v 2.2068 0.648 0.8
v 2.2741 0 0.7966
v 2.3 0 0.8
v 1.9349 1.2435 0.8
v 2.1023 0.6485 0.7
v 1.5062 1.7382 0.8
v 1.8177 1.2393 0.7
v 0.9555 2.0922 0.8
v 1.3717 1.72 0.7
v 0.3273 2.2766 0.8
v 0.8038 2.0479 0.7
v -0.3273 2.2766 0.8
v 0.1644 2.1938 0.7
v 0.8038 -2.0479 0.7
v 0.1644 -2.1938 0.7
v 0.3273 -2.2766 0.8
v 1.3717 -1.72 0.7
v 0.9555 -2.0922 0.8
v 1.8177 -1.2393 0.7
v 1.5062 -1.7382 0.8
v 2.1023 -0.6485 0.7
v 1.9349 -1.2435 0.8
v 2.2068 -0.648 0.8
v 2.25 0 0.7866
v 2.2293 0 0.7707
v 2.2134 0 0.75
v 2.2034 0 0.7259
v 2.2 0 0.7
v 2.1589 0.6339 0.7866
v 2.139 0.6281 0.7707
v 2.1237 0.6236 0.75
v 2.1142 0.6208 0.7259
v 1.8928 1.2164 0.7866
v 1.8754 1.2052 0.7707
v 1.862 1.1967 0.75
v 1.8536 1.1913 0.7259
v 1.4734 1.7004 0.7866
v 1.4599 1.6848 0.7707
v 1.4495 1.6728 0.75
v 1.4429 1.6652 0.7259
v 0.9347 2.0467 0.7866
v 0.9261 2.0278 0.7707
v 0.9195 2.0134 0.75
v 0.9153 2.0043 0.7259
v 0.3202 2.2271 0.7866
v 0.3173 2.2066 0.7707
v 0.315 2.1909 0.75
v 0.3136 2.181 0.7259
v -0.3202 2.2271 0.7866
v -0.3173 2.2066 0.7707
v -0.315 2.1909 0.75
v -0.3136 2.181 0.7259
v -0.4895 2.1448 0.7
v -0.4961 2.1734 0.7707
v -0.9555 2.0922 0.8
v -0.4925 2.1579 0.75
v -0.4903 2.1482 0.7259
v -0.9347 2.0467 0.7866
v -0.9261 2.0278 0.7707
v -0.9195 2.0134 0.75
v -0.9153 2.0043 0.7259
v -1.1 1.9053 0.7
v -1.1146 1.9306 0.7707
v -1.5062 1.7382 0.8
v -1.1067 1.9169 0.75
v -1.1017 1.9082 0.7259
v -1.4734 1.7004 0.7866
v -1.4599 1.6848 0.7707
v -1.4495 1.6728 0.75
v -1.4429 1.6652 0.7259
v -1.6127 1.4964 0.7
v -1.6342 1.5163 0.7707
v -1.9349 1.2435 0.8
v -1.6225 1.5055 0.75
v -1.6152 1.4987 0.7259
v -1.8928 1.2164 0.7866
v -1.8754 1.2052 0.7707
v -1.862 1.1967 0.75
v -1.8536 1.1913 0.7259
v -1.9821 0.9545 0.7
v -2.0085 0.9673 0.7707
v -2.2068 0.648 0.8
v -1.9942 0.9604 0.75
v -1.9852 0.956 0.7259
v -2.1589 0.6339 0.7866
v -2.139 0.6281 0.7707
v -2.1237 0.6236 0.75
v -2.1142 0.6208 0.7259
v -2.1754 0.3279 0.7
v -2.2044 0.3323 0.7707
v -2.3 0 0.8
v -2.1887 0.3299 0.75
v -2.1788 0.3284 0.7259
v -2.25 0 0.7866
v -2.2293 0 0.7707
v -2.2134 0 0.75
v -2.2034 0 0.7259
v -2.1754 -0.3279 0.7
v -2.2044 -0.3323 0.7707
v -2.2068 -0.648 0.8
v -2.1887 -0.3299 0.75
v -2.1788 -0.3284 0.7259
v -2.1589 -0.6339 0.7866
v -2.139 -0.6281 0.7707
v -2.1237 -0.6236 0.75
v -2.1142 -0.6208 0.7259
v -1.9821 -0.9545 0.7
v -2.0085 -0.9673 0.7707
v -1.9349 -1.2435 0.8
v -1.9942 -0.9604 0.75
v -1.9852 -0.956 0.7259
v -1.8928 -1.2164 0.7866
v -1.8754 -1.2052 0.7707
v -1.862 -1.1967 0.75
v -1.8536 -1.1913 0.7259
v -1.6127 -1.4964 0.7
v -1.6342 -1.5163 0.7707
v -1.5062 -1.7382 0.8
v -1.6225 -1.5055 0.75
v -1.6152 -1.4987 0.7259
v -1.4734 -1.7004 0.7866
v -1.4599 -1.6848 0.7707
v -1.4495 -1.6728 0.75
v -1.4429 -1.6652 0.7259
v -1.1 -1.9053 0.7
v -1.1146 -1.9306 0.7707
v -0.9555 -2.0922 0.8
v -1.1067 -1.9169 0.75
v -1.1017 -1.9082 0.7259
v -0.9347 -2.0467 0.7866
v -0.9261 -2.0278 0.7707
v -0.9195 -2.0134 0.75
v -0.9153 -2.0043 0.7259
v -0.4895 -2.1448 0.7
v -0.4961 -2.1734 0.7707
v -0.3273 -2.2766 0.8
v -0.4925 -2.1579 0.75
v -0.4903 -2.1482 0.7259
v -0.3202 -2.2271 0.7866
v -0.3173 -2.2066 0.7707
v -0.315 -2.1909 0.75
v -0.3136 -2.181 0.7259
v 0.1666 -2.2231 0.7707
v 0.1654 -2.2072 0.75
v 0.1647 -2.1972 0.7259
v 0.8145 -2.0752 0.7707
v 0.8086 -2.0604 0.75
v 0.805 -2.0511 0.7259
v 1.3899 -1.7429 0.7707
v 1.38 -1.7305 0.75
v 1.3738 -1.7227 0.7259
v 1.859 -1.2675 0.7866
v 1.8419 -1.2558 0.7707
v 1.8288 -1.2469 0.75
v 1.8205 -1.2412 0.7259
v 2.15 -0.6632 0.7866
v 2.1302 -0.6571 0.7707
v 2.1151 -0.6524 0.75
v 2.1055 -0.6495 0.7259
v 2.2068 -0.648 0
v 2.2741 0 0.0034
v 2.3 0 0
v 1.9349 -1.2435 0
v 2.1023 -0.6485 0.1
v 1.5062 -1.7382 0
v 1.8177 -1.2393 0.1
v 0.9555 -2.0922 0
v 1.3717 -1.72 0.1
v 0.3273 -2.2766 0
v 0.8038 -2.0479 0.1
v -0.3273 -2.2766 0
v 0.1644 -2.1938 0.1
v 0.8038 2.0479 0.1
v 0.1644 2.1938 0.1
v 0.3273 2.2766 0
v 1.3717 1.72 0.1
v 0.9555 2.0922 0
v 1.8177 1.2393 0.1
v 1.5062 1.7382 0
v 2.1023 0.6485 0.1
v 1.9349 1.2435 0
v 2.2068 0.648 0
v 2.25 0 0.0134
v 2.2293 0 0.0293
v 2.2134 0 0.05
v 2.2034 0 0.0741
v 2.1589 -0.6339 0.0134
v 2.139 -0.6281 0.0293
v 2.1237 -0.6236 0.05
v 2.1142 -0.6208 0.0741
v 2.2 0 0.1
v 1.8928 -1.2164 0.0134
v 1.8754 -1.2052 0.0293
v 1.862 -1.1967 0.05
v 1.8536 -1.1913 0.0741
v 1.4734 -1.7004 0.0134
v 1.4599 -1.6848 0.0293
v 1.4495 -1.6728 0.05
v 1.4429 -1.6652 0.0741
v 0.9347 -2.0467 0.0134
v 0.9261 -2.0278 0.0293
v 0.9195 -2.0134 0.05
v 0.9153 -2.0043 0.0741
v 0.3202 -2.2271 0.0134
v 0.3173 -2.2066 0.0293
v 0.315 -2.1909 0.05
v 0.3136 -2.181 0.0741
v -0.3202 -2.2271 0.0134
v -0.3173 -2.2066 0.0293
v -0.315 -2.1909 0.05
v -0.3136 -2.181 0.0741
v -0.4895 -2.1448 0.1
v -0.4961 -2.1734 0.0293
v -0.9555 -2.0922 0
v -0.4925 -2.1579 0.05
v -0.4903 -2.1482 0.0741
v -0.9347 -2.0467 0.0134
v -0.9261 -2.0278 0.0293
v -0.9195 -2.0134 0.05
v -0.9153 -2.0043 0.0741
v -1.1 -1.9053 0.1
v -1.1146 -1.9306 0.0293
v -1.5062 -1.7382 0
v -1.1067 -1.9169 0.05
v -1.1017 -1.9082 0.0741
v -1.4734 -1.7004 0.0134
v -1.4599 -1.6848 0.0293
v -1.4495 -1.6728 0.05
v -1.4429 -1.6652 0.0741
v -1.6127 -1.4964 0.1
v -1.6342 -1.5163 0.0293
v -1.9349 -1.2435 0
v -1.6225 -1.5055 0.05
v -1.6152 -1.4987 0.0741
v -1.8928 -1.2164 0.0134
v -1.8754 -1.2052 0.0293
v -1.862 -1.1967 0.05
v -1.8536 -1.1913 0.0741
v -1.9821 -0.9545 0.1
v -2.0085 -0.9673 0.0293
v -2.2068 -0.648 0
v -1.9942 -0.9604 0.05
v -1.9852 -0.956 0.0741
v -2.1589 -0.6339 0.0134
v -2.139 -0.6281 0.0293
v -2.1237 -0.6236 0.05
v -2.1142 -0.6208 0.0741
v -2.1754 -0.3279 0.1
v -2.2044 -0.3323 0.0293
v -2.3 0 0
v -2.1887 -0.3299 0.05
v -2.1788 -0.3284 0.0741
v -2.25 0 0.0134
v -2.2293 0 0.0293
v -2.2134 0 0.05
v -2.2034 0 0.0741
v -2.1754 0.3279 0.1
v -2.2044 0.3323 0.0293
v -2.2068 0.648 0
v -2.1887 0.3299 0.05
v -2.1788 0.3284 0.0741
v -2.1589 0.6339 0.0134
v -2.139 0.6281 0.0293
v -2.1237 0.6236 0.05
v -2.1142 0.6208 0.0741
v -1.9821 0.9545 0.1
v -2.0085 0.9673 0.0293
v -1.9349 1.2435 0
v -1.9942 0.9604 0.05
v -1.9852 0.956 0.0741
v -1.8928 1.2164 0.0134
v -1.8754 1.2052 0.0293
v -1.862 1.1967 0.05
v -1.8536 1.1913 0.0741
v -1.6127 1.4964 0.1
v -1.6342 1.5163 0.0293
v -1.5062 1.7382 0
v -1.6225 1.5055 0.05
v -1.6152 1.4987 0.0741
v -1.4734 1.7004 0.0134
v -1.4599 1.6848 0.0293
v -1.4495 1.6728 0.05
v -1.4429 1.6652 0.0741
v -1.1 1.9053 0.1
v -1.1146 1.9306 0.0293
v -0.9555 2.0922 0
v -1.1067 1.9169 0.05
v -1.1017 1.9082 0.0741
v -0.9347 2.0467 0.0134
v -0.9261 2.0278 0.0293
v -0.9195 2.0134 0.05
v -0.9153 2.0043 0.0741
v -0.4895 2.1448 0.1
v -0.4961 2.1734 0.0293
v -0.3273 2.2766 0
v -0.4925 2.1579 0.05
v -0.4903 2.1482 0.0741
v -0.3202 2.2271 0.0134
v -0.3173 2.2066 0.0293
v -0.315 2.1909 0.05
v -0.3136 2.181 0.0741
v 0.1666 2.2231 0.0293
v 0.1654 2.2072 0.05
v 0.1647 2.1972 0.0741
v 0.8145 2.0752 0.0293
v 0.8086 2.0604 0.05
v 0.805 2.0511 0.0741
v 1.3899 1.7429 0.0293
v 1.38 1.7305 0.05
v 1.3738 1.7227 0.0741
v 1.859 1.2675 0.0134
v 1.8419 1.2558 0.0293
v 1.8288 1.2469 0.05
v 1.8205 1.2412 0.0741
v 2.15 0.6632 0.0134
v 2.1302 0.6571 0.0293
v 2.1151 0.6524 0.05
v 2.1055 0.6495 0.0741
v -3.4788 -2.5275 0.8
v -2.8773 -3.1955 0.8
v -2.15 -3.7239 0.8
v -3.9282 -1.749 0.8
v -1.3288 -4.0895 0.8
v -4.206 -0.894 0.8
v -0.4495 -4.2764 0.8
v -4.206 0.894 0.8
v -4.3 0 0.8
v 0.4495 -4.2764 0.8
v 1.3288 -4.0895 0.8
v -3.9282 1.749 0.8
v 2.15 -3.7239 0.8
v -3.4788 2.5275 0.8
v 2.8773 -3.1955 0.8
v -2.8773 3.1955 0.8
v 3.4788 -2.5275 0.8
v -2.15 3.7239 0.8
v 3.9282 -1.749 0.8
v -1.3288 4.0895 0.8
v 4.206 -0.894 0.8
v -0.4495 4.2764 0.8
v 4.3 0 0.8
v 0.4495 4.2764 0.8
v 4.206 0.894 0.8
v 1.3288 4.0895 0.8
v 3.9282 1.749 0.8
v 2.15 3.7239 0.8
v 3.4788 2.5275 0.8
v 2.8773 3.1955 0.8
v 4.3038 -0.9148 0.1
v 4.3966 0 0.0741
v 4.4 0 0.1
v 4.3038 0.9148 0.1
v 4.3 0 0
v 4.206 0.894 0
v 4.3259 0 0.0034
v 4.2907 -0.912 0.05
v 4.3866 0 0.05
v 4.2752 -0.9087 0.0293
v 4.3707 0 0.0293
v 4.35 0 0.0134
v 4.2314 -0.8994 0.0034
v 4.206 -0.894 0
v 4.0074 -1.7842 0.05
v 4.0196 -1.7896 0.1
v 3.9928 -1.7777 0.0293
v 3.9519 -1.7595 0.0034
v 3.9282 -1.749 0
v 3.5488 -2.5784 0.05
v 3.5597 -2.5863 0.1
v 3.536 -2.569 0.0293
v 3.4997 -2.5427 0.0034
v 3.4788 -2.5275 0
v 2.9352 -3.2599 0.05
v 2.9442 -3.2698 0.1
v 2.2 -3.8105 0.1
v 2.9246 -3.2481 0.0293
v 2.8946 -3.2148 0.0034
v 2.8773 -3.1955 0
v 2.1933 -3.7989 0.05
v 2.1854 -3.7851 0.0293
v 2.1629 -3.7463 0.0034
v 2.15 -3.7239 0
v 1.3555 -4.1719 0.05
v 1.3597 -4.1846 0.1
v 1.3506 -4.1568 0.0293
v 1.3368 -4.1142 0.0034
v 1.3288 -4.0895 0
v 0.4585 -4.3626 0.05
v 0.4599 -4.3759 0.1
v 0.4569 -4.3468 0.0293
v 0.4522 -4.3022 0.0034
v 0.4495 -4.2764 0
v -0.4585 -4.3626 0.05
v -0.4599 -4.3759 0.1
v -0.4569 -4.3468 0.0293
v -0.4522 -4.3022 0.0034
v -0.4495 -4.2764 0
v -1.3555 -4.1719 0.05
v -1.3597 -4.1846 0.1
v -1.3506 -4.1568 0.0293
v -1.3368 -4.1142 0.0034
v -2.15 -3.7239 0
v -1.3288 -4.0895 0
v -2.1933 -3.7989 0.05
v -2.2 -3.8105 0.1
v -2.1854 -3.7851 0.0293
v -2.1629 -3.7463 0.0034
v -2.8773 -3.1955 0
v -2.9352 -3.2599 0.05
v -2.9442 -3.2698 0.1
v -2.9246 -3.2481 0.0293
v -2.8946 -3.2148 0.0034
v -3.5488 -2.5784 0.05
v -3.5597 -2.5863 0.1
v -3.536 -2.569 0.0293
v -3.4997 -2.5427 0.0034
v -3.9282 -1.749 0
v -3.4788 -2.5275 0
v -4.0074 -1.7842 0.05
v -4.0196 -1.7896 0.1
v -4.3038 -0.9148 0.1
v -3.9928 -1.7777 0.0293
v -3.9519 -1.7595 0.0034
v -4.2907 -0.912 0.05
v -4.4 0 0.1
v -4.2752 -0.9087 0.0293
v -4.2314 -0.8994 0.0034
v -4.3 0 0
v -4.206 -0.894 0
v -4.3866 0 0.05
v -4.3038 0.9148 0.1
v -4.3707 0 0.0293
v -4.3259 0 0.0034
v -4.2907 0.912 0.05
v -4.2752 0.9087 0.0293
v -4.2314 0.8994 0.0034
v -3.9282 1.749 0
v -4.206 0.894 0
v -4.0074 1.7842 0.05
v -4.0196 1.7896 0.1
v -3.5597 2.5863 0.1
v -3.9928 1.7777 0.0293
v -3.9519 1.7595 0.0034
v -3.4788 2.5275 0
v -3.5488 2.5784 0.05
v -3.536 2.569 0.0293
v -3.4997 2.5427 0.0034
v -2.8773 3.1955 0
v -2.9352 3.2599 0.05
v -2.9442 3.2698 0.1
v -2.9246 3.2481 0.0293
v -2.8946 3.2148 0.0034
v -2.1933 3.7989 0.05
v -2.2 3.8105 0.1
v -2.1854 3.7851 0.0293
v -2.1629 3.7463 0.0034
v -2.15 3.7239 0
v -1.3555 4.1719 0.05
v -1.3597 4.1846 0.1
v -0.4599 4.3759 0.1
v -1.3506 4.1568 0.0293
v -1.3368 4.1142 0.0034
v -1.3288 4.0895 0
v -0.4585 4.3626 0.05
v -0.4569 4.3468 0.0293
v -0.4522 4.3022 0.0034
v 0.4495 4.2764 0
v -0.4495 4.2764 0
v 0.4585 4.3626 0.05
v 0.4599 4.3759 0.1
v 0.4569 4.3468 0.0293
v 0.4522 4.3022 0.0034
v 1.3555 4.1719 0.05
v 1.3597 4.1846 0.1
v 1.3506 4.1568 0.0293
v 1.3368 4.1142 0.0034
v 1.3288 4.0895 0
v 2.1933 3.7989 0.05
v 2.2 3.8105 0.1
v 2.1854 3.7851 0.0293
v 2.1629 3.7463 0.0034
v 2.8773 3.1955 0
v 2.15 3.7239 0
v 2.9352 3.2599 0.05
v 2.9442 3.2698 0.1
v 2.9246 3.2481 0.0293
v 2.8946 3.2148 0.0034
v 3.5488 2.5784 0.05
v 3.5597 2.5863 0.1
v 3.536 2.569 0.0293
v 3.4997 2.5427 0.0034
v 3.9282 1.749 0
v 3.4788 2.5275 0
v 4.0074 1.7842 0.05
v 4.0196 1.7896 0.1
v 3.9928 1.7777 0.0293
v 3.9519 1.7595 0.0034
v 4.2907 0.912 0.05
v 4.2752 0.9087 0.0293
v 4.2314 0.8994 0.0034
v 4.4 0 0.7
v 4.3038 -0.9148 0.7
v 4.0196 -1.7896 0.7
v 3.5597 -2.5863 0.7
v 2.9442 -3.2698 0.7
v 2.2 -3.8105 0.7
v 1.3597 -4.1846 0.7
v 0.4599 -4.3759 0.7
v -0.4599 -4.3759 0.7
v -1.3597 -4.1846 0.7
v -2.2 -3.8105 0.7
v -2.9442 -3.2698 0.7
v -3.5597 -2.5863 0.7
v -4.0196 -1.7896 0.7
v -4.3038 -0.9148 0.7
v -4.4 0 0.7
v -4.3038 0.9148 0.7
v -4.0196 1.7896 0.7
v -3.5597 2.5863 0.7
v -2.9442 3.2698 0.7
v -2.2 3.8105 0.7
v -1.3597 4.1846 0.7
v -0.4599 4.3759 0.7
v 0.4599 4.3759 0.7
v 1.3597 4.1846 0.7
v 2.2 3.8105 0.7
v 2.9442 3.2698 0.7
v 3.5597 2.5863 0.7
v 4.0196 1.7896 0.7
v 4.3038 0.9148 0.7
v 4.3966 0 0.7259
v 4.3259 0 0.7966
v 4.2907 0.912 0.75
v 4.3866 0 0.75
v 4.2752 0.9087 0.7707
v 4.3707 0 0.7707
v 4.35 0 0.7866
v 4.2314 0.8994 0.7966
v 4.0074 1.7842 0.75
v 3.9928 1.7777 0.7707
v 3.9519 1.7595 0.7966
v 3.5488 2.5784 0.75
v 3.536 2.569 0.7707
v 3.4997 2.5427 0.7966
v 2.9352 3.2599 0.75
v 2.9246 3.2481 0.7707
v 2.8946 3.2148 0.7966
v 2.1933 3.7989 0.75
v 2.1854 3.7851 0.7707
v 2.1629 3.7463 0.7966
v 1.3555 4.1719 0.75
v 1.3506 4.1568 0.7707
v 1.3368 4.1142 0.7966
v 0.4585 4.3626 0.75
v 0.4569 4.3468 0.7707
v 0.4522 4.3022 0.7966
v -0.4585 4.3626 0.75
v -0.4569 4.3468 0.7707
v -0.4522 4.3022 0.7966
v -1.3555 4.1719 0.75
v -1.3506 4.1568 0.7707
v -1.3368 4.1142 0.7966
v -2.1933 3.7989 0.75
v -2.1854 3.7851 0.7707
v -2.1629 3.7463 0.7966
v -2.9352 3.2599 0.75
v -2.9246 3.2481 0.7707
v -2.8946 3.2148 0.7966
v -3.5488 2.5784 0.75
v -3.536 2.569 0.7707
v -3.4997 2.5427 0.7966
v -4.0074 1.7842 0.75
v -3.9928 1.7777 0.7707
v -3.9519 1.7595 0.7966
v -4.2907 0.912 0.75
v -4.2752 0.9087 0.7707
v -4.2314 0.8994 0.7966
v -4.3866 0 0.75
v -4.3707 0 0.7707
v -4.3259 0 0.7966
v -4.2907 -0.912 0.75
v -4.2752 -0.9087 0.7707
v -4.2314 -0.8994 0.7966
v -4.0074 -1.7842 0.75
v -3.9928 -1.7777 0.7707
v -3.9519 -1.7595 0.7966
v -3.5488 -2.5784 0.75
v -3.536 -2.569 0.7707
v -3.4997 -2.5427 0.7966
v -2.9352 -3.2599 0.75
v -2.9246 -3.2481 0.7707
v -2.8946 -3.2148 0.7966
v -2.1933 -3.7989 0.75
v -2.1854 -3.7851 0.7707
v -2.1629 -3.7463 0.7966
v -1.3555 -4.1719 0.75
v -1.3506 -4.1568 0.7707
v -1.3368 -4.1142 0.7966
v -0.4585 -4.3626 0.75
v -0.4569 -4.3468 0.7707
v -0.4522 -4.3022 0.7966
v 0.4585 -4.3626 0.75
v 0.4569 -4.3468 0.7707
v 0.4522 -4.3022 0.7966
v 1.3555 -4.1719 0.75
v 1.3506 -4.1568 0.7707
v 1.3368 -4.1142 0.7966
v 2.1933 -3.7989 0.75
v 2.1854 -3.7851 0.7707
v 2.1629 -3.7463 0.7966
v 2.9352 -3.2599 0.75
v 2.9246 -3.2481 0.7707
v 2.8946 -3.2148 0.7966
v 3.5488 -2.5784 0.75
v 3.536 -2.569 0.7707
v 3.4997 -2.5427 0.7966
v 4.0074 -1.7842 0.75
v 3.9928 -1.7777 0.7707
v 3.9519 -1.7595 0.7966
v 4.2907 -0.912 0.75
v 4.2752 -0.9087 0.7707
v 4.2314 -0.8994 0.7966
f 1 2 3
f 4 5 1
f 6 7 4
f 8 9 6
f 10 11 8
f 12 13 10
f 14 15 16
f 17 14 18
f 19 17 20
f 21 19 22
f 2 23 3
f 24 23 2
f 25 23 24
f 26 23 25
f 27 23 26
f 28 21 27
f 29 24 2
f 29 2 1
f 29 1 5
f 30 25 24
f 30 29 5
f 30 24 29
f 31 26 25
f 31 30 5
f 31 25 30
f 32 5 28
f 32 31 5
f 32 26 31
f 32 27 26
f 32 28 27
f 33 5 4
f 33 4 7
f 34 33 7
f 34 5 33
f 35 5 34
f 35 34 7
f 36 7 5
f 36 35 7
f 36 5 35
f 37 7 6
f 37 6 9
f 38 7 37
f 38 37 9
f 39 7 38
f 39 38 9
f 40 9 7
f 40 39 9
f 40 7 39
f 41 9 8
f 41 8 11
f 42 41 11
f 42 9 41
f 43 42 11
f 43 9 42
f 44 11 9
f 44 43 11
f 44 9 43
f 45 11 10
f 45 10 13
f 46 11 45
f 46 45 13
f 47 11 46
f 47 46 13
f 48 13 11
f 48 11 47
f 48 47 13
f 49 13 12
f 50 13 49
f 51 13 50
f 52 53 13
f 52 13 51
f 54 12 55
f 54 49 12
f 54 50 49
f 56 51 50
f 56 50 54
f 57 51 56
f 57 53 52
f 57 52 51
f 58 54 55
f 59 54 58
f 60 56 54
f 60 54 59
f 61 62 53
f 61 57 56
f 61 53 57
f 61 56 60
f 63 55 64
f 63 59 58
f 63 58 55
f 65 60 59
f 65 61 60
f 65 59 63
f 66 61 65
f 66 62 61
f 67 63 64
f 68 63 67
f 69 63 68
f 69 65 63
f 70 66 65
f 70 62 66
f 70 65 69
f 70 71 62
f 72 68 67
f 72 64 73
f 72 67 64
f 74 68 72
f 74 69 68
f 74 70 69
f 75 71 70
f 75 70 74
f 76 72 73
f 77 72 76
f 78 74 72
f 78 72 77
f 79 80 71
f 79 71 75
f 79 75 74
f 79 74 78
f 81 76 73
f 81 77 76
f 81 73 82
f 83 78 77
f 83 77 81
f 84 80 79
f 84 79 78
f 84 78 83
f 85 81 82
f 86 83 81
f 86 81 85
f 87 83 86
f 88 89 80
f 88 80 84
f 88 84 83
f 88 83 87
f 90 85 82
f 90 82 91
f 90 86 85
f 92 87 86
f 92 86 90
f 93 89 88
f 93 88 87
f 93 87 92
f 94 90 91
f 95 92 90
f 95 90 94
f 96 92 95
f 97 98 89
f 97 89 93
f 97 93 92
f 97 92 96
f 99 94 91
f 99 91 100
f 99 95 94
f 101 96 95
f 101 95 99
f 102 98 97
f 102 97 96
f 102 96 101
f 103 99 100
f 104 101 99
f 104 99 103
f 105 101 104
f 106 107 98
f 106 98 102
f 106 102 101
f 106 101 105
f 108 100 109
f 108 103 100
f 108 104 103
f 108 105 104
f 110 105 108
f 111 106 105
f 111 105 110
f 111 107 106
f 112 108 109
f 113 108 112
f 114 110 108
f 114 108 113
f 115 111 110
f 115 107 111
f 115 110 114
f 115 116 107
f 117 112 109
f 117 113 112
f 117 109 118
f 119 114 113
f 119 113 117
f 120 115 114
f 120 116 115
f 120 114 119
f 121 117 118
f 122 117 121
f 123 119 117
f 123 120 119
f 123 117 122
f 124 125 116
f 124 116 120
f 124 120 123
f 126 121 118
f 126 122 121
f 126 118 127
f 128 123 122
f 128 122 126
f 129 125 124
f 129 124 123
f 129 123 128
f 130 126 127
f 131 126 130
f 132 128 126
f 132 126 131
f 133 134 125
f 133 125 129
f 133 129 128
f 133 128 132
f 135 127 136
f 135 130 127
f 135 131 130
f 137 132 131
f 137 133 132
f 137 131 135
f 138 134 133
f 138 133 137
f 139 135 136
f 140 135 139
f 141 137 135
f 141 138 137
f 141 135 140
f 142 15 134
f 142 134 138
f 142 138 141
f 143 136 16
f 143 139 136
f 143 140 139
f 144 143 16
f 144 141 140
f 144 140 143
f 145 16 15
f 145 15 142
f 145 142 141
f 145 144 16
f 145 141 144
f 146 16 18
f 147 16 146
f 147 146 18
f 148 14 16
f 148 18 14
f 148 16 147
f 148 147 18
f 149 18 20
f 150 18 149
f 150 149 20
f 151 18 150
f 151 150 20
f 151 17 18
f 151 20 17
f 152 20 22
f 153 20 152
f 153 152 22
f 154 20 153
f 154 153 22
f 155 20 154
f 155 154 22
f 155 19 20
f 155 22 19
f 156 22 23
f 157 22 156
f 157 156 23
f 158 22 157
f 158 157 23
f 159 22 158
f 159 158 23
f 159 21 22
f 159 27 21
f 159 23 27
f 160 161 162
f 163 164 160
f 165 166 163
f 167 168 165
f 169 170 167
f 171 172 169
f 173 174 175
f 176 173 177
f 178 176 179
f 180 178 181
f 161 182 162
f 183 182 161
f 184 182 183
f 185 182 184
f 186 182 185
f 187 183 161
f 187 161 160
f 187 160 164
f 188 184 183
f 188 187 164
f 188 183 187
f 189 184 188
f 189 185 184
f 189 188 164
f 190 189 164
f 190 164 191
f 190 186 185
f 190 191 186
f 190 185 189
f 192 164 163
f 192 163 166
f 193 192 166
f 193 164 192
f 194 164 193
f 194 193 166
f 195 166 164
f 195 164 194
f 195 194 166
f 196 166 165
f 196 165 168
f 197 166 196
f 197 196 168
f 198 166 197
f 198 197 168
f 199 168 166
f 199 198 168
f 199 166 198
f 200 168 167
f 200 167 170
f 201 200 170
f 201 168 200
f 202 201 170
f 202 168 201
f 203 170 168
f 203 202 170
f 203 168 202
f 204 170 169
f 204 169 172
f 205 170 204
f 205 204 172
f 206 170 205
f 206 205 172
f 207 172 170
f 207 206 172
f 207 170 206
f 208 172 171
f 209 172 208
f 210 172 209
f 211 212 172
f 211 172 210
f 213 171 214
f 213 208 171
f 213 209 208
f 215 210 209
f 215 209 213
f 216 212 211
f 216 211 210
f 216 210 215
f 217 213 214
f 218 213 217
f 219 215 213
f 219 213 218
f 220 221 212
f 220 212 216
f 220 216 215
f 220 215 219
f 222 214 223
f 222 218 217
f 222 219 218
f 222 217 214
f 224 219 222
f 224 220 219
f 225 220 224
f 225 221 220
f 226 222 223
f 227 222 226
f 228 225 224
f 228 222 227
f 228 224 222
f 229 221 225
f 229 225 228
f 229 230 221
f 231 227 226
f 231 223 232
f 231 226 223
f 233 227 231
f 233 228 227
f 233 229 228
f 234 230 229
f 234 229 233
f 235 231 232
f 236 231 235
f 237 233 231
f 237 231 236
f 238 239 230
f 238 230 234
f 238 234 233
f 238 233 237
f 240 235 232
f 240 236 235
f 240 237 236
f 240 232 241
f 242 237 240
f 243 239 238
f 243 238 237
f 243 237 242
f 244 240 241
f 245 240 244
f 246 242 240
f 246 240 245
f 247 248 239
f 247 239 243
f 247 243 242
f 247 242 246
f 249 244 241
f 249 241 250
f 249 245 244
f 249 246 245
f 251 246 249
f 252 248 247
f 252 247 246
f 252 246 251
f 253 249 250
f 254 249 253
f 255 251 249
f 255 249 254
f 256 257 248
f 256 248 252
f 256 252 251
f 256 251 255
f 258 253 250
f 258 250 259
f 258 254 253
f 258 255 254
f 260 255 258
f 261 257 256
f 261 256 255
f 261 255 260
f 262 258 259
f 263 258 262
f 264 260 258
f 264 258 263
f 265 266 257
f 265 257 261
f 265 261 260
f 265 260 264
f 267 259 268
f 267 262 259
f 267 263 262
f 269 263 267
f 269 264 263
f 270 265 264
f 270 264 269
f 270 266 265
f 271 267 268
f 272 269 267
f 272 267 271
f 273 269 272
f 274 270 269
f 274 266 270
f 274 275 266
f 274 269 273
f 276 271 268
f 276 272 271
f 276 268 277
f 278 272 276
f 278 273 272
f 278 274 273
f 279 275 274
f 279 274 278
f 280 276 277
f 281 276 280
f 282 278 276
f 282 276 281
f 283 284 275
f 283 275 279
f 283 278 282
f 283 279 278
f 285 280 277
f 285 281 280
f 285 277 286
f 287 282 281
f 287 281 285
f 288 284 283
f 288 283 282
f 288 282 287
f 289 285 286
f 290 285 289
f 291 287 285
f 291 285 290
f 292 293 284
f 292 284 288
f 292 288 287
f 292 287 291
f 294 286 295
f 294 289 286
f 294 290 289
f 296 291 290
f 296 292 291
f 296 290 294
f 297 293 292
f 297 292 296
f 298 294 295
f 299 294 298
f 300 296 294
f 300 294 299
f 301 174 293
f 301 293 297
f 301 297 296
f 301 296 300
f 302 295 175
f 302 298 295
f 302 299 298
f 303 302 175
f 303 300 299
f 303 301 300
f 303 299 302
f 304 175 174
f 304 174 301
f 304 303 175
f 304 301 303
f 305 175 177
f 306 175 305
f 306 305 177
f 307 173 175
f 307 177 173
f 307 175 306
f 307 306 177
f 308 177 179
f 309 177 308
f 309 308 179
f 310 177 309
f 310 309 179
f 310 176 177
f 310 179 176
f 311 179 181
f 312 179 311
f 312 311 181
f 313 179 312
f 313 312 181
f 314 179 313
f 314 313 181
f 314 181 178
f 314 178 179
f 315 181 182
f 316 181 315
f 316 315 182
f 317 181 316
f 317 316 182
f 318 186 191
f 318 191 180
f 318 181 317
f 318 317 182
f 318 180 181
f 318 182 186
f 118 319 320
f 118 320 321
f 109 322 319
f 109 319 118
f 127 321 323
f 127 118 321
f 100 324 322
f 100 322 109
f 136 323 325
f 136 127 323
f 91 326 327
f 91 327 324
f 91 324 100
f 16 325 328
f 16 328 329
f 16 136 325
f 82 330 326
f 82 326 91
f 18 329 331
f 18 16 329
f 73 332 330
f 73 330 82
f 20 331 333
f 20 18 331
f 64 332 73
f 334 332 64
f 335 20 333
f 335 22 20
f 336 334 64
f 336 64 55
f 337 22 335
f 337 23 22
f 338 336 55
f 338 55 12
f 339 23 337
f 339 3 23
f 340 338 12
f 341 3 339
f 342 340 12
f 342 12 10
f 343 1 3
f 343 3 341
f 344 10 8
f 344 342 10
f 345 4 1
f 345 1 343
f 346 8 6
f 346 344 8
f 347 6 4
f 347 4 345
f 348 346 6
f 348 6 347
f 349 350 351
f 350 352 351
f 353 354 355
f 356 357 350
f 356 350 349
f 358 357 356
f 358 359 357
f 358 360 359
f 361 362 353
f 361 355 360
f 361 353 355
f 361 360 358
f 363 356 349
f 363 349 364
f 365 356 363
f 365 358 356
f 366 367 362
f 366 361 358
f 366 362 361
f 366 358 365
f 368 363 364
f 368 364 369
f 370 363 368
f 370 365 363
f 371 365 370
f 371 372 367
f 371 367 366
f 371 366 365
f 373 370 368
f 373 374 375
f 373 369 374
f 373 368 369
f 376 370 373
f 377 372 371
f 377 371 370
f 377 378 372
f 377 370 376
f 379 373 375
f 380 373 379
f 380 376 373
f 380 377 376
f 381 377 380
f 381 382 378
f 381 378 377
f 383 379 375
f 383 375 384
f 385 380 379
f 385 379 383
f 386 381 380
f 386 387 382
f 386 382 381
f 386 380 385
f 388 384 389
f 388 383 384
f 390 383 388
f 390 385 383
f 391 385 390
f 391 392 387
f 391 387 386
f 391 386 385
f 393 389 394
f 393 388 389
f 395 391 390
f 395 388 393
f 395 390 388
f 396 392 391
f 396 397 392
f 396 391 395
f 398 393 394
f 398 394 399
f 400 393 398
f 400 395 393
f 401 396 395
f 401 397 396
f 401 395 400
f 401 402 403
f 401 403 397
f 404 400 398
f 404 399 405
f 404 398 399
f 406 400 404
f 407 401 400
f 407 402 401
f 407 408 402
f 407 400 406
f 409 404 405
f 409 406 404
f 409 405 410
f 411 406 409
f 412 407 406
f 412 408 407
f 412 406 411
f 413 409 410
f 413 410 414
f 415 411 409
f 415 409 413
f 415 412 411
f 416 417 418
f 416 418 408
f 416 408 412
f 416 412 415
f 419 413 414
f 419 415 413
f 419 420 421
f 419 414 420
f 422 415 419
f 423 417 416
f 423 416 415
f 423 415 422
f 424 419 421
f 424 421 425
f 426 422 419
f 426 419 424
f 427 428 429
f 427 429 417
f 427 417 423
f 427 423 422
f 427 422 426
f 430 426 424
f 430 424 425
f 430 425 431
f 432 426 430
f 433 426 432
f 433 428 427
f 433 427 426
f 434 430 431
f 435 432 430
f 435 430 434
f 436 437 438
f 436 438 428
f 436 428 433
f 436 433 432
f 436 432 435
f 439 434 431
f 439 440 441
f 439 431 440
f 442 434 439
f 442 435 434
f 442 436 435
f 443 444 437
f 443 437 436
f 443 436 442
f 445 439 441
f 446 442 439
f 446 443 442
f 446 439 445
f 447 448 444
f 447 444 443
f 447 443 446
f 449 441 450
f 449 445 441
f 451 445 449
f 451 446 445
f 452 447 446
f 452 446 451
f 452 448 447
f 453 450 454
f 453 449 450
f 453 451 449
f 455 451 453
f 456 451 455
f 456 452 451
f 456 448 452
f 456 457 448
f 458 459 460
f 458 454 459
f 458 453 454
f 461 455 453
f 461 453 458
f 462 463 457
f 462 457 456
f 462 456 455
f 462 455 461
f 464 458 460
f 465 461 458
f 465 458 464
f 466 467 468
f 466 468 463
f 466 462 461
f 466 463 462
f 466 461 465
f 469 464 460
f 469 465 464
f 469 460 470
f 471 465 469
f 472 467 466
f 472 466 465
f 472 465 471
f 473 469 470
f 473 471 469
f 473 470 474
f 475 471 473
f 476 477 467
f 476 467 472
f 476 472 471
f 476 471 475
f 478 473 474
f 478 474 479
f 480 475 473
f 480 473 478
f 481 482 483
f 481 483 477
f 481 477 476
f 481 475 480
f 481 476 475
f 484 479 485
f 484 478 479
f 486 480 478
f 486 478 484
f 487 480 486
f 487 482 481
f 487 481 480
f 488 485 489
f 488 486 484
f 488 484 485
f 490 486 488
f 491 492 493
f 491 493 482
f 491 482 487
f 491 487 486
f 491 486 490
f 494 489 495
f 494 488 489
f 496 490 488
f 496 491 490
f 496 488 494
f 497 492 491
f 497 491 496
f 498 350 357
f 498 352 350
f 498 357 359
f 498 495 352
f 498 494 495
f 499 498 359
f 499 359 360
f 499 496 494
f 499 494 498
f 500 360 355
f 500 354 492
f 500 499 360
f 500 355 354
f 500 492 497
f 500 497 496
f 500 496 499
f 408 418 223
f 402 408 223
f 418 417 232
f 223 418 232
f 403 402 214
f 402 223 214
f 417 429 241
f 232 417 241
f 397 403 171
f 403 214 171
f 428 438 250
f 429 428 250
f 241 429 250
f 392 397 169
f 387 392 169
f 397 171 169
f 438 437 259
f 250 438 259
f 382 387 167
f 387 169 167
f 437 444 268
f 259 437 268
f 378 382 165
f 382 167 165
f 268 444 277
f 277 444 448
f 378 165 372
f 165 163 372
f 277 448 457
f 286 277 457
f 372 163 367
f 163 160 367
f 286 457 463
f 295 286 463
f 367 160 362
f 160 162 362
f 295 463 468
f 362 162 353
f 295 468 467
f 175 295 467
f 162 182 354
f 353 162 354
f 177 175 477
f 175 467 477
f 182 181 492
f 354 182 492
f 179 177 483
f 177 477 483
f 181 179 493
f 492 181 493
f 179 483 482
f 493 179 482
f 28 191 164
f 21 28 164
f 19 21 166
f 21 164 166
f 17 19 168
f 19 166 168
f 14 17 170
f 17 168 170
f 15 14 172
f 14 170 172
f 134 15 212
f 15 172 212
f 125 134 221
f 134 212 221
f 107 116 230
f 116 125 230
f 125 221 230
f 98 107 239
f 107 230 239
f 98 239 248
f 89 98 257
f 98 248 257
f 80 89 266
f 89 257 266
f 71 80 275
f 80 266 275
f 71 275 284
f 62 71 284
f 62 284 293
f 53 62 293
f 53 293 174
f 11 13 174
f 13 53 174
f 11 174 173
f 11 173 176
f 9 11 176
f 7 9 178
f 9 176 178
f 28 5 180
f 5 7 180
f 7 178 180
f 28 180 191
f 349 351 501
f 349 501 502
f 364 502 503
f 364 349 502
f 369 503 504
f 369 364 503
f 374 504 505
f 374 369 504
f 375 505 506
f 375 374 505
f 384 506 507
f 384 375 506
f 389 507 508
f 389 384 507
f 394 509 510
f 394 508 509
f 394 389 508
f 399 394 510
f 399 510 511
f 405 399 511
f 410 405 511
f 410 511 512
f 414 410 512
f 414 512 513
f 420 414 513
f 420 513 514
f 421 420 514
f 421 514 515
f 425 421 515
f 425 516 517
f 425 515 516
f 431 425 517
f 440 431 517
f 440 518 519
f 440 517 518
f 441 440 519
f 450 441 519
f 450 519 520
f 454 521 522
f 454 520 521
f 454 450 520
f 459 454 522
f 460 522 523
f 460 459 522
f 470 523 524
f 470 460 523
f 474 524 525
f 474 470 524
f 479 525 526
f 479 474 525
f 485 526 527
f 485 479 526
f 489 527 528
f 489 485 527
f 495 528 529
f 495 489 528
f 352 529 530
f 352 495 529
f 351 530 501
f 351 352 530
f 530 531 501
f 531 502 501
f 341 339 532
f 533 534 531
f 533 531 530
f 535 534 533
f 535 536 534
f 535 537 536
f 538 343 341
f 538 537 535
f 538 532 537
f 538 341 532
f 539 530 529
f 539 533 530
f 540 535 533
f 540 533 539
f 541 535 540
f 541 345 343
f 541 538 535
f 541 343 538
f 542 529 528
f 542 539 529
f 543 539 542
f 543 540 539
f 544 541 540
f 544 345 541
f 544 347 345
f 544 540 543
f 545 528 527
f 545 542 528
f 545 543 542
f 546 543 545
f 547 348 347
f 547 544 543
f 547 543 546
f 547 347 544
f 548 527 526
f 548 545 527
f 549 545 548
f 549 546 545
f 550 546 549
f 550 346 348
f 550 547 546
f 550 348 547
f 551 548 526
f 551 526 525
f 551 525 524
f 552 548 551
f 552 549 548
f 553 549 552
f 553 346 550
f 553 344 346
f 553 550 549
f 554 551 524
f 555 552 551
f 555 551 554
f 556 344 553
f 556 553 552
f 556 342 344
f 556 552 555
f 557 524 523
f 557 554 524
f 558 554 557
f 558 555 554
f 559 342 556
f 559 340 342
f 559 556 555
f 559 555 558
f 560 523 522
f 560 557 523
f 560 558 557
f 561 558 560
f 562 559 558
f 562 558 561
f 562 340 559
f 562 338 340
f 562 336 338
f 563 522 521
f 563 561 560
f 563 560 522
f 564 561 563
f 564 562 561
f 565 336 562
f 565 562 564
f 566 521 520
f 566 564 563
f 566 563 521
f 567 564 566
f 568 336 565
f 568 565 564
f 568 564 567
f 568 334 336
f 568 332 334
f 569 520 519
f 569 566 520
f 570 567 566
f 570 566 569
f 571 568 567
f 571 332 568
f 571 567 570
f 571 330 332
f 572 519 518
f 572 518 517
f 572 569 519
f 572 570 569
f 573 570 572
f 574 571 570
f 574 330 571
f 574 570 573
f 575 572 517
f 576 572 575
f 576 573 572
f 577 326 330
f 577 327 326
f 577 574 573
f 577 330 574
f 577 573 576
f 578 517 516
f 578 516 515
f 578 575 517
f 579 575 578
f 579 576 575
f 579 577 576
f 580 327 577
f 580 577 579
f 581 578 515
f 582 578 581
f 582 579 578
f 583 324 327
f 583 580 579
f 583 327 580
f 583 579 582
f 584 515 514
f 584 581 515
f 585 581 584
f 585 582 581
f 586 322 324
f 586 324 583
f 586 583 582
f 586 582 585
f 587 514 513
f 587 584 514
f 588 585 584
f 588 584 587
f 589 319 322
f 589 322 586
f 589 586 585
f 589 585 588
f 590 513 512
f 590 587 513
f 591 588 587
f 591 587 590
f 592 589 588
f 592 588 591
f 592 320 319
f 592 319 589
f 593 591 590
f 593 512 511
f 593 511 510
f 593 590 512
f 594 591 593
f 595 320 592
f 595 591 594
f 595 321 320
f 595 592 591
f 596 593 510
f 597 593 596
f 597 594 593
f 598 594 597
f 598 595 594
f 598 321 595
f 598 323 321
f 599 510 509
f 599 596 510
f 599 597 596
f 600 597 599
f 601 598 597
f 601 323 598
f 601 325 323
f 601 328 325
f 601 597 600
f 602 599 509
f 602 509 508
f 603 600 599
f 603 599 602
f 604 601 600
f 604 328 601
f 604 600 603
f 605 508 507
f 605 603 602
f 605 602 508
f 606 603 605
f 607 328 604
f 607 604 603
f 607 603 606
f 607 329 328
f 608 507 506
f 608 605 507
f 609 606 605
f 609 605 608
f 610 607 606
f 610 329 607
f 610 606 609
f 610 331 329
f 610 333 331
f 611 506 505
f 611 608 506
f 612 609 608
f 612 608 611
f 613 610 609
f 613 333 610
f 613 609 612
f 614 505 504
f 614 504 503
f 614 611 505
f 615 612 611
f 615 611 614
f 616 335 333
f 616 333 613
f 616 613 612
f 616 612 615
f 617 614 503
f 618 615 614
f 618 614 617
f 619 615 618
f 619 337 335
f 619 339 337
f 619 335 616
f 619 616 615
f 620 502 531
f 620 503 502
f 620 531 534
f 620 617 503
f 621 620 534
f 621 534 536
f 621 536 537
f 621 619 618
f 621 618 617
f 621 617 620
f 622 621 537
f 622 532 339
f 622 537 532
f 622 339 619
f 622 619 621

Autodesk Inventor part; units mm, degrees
ref_plane "YZ Plane" through (0, 0, 0) normal (1, 0, 0) x (0, 1, 0)
ref_plane "XZ Plane" through (0, 0, 0) normal (0, 1, 0) x (-1, 0, 0)
ref_plane "XY Plane" through (0, 0, 0) normal (0, 0, 1) x (1, 0, 0)
sketch "Esboço1" plane through (0, 0, 0) normal (0, 0, 1) x (1, 0, 0)
  circle A0 centre (0, 0) radius 2.2
  circle A1 centre (0, 0) radius 4.4
  dimension "d0" = 4.4
  dimension "d1" = 8.8
extrude "Extrusão1" add sketch "Esboço1" along normal blind 0.8
fillet "Arredondamento1" radius 0.1 1 edges at (-4.4, 0, 0.8)
fillet "Arredondamento2" radius 0.1 3 edges at (-2.2, 0, 0.8) (-4.4, 0, 0) (-2.2, 0, 0)
properties part number "Arruela m4" material "Aço inoxidável AISI 304"
